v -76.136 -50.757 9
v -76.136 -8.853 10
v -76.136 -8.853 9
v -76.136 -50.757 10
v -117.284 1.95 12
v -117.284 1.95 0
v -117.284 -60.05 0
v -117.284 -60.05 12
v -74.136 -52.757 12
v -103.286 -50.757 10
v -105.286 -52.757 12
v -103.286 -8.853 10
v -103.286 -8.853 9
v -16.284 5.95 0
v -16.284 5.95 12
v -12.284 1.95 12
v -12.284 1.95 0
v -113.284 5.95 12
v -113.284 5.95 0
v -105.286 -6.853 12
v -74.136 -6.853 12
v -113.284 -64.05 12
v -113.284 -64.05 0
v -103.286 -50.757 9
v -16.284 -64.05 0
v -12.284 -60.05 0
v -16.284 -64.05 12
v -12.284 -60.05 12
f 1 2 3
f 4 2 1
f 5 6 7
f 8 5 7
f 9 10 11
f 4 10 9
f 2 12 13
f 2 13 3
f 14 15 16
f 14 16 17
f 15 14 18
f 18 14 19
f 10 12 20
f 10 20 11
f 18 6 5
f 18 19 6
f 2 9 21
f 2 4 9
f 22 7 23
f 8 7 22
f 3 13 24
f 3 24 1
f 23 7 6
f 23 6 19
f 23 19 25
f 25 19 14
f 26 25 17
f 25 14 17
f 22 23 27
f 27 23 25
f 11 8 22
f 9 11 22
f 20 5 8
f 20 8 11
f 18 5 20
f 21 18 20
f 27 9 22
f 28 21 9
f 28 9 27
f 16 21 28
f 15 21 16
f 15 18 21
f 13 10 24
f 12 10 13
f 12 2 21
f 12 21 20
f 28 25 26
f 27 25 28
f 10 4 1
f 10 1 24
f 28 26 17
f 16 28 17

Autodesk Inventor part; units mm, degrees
ref_plane "YZ Plane" through (0, 0, 0) normal (1, 0, 0) x (0, 1, 0)
ref_plane "XZ Plane" through (0, 0, 0) normal (0, 1, 0) x (-1, 0, 0)
ref_plane "XY Plane" through (0, 0, 0) normal (0, 0, 1) x (1, 0, 0)
sketch "Sketch1" plane through (0, 0, 0) normal (0, 0, 1) x (1, 0, 0)
  line L0 (-12.2838, 5.95) -> (-117.2838, 5.95)
  line L1 (-117.2838, 5.95) -> (-117.2838, -64.05)
  line L2 (-117.2838, -64.05) -> (-12.2838, -64.05)
  line L3 (-12.2838, -64.05) -> (-12.2838, 5.95)
  point P0 (0, 0)
  dimension "d0" = 105
  dimension "d1" = 70
extrude "Extrusion1" add sketch "Sketch1" along normal blind 12
chamfer "Chamfer1" distance 4 angle 45 4 edges at (-12.2838, 5.95, 6) (-12.2838, -64.05, 6) (-117.2838, -64.05, 6) (-117.2838, 5.95, 6)
sketch "Sketch2" plane through (0, 0, 12) normal (0, 0, 1) x (1, 0, 0)
  line L0 (-103.2855, -8.853) -> (-76.1362, -8.853)
  line L1 (-76.1362, -8.853) -> (-76.1362, -50.7574)
  line L2 (-76.1362, -50.7574) -> (-103.2855, -50.7574)
  line L3 (-103.2855, -50.7574) -> (-103.2855, -8.853)
  point P0 (0, 0)
extrude "Extrusion2" cut sketch "Sketch2" against normal blind 3
chamfer "Chamfer2" distance 2 angle 45 4 edges at (-103.2855, -29.8052, 12) (-89.7108, -8.853, 12) (-76.1362, -29.8052, 12) (-89.7108, -50.7574, 12)
properties part number "RFID scanner"
